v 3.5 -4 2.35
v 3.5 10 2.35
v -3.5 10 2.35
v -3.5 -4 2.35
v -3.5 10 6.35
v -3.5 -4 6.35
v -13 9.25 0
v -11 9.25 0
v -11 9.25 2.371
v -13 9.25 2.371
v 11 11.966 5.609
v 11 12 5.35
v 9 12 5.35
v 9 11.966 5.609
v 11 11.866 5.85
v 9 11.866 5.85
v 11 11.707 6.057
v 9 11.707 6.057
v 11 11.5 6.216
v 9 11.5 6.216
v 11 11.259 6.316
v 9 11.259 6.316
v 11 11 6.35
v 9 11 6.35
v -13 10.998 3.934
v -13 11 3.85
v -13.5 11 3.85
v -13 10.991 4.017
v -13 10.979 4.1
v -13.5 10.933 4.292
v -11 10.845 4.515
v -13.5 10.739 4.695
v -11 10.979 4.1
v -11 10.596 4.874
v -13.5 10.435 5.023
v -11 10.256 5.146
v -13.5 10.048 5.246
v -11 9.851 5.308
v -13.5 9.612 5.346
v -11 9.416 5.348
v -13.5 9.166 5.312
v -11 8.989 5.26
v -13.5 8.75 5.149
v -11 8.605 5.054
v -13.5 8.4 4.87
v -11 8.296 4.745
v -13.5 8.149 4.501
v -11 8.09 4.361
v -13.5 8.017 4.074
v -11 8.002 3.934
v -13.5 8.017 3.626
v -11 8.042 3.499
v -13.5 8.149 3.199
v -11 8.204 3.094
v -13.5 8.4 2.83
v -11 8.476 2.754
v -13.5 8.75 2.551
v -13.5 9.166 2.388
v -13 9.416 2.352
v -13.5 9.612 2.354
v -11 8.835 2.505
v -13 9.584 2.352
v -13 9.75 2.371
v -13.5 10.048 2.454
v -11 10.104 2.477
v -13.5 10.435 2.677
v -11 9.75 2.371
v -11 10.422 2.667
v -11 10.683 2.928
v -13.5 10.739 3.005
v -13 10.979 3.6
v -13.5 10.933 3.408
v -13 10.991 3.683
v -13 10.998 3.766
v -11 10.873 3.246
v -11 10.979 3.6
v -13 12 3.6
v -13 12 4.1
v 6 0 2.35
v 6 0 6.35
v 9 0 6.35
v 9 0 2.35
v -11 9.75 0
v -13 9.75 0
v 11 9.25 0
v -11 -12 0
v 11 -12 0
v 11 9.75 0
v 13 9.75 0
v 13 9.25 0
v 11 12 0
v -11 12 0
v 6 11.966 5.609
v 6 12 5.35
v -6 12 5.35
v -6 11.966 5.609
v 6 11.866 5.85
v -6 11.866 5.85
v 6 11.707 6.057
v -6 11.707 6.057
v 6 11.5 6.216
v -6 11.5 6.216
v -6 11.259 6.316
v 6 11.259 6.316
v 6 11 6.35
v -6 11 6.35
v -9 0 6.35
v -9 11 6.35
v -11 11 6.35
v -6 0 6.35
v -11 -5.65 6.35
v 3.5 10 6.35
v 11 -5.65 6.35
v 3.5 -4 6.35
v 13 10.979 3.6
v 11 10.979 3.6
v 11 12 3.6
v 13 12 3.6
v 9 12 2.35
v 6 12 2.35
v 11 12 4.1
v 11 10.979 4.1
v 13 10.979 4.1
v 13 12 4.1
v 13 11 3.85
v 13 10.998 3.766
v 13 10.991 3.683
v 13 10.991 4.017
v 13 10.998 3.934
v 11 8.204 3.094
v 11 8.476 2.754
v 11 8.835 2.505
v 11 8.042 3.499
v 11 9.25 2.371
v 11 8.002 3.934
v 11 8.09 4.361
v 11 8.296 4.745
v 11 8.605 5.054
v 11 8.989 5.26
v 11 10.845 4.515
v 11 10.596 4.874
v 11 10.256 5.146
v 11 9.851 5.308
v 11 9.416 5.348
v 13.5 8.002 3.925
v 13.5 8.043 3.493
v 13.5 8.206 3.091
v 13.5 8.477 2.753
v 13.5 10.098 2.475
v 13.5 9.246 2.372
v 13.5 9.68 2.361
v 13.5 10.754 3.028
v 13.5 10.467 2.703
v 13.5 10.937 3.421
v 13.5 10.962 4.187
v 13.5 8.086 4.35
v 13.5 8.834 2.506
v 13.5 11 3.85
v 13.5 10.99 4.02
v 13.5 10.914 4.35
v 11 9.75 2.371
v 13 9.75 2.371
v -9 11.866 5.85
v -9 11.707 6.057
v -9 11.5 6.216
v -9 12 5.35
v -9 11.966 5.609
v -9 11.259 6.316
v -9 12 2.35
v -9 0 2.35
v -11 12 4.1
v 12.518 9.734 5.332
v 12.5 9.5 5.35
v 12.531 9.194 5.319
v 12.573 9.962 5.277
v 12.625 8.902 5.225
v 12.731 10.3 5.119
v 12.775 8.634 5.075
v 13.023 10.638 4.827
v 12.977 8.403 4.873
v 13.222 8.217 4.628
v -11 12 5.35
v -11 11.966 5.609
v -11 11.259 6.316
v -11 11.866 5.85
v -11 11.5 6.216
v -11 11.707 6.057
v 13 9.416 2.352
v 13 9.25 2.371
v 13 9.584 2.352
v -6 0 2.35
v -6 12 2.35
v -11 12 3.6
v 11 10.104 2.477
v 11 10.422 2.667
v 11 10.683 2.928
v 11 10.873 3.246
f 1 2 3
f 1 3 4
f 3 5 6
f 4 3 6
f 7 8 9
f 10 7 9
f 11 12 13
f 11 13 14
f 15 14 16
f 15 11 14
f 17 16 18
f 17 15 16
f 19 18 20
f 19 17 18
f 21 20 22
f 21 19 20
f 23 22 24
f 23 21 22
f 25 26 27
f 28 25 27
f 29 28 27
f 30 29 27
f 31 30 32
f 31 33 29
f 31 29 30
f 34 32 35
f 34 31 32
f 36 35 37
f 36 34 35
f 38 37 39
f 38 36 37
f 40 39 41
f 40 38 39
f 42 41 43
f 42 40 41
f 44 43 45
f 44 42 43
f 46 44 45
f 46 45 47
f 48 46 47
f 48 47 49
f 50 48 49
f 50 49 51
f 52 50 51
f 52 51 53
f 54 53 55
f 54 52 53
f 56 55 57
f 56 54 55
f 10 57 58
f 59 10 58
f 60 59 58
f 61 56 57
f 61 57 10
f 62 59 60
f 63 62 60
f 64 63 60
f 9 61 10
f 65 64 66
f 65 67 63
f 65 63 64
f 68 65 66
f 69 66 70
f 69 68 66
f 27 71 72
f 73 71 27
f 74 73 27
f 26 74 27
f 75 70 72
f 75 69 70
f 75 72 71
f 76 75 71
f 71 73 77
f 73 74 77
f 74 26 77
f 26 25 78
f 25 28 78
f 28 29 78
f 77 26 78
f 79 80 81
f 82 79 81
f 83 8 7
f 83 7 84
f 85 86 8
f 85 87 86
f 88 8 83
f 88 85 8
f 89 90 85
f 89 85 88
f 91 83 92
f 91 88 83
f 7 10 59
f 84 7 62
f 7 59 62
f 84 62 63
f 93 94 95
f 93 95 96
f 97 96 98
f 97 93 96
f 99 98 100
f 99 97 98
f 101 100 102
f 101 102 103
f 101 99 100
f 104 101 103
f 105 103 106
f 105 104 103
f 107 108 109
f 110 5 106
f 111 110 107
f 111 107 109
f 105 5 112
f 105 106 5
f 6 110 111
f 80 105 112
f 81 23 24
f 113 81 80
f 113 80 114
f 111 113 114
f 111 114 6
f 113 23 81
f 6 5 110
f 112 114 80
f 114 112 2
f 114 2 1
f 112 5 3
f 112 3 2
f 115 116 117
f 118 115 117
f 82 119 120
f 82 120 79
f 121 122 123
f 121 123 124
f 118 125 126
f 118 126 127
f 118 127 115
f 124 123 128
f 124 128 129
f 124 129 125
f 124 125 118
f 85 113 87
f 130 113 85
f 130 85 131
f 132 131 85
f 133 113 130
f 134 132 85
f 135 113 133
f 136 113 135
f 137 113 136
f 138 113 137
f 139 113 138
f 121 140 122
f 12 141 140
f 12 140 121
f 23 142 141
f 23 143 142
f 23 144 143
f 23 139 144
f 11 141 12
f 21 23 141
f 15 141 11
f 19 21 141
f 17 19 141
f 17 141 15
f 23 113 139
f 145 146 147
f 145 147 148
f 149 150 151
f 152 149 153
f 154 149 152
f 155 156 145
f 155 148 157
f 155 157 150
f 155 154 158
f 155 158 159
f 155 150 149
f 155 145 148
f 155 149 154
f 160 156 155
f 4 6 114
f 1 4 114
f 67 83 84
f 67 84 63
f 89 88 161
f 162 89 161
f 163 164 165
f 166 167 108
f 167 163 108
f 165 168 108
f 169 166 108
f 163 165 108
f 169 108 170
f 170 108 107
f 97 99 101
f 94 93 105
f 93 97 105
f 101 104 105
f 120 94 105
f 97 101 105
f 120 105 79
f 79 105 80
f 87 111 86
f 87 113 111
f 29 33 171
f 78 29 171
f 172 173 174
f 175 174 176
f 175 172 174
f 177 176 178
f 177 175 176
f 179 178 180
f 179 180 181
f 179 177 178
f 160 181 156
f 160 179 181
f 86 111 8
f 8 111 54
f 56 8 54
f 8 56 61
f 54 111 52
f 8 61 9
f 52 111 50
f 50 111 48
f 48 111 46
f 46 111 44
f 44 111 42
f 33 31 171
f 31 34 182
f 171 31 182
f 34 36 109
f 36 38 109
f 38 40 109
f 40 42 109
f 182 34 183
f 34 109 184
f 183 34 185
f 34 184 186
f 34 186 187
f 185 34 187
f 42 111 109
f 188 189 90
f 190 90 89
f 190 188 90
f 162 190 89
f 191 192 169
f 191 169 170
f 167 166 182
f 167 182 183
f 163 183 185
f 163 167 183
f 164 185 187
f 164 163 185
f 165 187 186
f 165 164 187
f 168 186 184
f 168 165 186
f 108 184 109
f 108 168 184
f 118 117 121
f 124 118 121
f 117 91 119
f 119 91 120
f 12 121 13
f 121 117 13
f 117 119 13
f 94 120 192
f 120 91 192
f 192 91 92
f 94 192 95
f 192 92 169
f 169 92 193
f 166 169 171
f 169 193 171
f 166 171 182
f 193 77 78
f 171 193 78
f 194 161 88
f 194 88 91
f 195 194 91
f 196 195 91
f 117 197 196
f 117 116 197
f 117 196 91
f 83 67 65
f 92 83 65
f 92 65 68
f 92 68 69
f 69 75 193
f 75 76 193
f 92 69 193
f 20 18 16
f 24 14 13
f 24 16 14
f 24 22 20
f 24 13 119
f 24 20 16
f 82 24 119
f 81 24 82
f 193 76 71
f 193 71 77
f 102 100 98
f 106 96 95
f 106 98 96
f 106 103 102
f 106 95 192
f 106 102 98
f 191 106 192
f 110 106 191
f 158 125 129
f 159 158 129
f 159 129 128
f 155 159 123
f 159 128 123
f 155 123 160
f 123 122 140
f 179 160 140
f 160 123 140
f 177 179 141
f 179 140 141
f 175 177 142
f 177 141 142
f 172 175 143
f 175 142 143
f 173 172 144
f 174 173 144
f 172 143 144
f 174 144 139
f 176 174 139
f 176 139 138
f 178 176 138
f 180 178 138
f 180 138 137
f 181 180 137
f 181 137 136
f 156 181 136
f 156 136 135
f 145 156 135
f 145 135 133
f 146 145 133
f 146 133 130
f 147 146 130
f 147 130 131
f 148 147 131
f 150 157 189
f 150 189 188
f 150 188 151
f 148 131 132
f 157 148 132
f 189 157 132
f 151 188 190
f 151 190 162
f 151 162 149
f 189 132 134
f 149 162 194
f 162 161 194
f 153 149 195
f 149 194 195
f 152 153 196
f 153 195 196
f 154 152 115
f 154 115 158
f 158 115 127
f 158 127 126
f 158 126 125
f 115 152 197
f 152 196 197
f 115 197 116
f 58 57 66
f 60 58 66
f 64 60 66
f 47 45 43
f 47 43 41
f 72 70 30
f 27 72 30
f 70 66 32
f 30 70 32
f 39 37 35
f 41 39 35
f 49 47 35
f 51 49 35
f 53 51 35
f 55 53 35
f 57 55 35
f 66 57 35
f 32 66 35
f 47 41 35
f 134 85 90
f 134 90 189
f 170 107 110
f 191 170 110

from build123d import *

# Parameters (mm, degrees)
PAD_DEPTH       = 11
SKETCH002_R     = 1.5
PAD001_DEPTH    = 2.5
POCKET_DEPTH    = 5
SKETCH004_W     = 2
SKETCH004_H     = 0.5
SKETCH004_W_2   = 0.5
SKETCH004_H_2   = 3.85
PAD002_DEPTH    = 2
SKETCH005_W     = 14
SKETCH005_H     = 7
SKETCH005_W_2   = 16
SKETCH005_H_2   = 3
POCKET001_DEPTH = 4


with BuildPart() as part:
    # Sketch001 → Pad (new body, symmetric)
    with BuildSketch(Plane.YZ):
        with BuildLine():
            Line((-12, 0), (12, 0))
            Line((12, 0), (12, 5.35))
            ThreePointArc((12, 5.35), (11.707107, 6.057107), (11, 6.35))
            Line((11, 6.35), (-5.65, 6.35))
            Line((-5.65, 6.35), (-12, 0))
        make_face()
    extrude(amount=PAD_DEPTH, both=True)

    # Sketch002 (on Face7 of Pad) → Pad001 (join)
    with BuildSketch(Plane.YZ.offset(11)):
        with Locations((9.5, 3.85)):
            Circle(SKETCH002_R)
    pad001 = extrude(amount=PAD001_DEPTH)

    # Sketch003 (on Face3 of Pad001) → Pocket (cut)
    with BuildSketch(Plane.ZX.offset(12)):
        Polygon((4.35, 13.5), (5.35, 13.5), (5.35, 12.5), align=None)
    pocket = extrude(amount=-POCKET_DEPTH, mode=Mode.SUBTRACT)

    # Sketch004 (on Face5 of Pocket) → Pad002 (join)
    with BuildSketch(Plane.YZ.offset(11)):
        with Locations((11, 3.85)):
            Rectangle(SKETCH004_W, SKETCH004_H)
        with Locations((9.5, 1.925)):
            Rectangle(SKETCH004_W_2, SKETCH004_H_2)
    pad002 = extrude(amount=PAD002_DEPTH)

    # Mirrored: Pad002, Pocket, Pad001 across YZ
    add(pad002.mirror(Plane.YZ))
    add(pocket.mirror(Plane.YZ), mode=Mode.SUBTRACT)
    add(pad001.mirror(Plane.YZ))

    # Sketch005 (on Face10 of Mirrored) → Pocket001 (cut)
    with BuildSketch(Plane(origin=(0, 0, 6.35), x_dir=(0, -1, 0), z_dir=(0, 0, 1))):
        with Locations((-3, 0)):
            Rectangle(SKETCH005_W, SKETCH005_H)
        with Locations((-8, 7.5)):
            Rectangle(SKETCH005_W_2, SKETCH005_H_2)
        with Locations((-8, -7.5)):
            Rectangle(SKETCH005_W_2, SKETCH005_H_2)
    extrude(amount=-POCKET001_DEPTH, mode=Mode.SUBTRACT)


solid = part.part
